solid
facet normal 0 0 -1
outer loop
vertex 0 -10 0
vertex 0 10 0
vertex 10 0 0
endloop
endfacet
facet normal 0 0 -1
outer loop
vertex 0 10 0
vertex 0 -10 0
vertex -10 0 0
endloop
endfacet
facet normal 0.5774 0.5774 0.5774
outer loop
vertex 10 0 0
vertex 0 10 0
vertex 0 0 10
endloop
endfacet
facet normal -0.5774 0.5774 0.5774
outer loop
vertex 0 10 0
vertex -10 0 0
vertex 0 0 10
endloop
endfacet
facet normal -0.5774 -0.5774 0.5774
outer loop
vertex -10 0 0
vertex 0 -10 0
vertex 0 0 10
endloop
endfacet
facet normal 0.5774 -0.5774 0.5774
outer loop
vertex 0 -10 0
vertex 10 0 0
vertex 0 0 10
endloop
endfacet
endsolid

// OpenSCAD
echo(version=version());

polyhedron(
	points = [
		[10, 0, 0],
		[0, 10, 0],
		[-10, 0, 0],
		[0, -10, 0],
		[0, 0, 10]
	],
	faces = [
		[0, 1, 2, 3],
		[4, 1, 0],
		[4, 2, 1],
		[4, 3, 2],
		[4, 0, 3]
	]
);
